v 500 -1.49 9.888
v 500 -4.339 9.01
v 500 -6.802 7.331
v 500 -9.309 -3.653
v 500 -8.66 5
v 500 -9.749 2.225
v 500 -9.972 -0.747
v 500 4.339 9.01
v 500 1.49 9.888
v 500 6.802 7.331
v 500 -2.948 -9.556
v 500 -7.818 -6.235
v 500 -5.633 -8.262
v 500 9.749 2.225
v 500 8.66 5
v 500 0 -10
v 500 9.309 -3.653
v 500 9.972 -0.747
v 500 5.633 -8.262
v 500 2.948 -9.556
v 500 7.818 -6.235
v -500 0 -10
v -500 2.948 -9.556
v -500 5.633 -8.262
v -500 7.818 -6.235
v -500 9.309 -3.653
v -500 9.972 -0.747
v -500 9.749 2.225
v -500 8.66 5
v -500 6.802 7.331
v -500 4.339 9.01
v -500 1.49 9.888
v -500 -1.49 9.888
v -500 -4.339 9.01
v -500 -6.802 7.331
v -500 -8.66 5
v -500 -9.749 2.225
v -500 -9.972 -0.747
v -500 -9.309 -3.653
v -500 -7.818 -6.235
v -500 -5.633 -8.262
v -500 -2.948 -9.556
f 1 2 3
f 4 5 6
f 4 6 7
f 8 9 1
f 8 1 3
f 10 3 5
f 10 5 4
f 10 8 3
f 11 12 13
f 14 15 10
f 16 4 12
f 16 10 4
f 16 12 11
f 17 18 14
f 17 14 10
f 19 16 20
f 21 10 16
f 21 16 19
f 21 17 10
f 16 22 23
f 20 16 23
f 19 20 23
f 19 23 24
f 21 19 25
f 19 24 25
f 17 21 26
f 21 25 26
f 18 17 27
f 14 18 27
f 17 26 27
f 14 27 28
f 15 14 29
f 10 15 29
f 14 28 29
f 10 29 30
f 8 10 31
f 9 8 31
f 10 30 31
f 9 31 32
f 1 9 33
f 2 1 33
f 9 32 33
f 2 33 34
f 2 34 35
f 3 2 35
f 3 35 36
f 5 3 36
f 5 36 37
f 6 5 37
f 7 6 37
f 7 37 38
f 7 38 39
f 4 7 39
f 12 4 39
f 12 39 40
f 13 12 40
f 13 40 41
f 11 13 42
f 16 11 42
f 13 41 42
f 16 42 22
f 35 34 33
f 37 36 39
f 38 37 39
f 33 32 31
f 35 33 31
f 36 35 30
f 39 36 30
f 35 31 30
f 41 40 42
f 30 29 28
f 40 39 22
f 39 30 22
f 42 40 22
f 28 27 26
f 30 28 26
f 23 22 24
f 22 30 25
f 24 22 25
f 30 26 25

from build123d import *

# Parameters (mm, degrees)
CYLINDER_R           = 10
CYLINDER_DEPTH       = 1000
CYLINDER_PITCH_ANGLE = 90


with BuildPart() as part:
    # Cylinder → Cylinder (new body)
    with BuildSketch(Plane.XY):
        Circle(CYLINDER_R)
    extrude(amount=CYLINDER_DEPTH)


with BuildPart() as part_1:
    # Cylinder pitch: moved
    add(part.part.rotate(Axis((0, 0, 0), (0, 1, 0)), CYLINDER_PITCH_ANGLE))


with BuildPart() as part_2:
    # Cylinder placement: moved
    add(part_1.part.moved(Location((-500, 0, 0))))


solid = part_2.part
